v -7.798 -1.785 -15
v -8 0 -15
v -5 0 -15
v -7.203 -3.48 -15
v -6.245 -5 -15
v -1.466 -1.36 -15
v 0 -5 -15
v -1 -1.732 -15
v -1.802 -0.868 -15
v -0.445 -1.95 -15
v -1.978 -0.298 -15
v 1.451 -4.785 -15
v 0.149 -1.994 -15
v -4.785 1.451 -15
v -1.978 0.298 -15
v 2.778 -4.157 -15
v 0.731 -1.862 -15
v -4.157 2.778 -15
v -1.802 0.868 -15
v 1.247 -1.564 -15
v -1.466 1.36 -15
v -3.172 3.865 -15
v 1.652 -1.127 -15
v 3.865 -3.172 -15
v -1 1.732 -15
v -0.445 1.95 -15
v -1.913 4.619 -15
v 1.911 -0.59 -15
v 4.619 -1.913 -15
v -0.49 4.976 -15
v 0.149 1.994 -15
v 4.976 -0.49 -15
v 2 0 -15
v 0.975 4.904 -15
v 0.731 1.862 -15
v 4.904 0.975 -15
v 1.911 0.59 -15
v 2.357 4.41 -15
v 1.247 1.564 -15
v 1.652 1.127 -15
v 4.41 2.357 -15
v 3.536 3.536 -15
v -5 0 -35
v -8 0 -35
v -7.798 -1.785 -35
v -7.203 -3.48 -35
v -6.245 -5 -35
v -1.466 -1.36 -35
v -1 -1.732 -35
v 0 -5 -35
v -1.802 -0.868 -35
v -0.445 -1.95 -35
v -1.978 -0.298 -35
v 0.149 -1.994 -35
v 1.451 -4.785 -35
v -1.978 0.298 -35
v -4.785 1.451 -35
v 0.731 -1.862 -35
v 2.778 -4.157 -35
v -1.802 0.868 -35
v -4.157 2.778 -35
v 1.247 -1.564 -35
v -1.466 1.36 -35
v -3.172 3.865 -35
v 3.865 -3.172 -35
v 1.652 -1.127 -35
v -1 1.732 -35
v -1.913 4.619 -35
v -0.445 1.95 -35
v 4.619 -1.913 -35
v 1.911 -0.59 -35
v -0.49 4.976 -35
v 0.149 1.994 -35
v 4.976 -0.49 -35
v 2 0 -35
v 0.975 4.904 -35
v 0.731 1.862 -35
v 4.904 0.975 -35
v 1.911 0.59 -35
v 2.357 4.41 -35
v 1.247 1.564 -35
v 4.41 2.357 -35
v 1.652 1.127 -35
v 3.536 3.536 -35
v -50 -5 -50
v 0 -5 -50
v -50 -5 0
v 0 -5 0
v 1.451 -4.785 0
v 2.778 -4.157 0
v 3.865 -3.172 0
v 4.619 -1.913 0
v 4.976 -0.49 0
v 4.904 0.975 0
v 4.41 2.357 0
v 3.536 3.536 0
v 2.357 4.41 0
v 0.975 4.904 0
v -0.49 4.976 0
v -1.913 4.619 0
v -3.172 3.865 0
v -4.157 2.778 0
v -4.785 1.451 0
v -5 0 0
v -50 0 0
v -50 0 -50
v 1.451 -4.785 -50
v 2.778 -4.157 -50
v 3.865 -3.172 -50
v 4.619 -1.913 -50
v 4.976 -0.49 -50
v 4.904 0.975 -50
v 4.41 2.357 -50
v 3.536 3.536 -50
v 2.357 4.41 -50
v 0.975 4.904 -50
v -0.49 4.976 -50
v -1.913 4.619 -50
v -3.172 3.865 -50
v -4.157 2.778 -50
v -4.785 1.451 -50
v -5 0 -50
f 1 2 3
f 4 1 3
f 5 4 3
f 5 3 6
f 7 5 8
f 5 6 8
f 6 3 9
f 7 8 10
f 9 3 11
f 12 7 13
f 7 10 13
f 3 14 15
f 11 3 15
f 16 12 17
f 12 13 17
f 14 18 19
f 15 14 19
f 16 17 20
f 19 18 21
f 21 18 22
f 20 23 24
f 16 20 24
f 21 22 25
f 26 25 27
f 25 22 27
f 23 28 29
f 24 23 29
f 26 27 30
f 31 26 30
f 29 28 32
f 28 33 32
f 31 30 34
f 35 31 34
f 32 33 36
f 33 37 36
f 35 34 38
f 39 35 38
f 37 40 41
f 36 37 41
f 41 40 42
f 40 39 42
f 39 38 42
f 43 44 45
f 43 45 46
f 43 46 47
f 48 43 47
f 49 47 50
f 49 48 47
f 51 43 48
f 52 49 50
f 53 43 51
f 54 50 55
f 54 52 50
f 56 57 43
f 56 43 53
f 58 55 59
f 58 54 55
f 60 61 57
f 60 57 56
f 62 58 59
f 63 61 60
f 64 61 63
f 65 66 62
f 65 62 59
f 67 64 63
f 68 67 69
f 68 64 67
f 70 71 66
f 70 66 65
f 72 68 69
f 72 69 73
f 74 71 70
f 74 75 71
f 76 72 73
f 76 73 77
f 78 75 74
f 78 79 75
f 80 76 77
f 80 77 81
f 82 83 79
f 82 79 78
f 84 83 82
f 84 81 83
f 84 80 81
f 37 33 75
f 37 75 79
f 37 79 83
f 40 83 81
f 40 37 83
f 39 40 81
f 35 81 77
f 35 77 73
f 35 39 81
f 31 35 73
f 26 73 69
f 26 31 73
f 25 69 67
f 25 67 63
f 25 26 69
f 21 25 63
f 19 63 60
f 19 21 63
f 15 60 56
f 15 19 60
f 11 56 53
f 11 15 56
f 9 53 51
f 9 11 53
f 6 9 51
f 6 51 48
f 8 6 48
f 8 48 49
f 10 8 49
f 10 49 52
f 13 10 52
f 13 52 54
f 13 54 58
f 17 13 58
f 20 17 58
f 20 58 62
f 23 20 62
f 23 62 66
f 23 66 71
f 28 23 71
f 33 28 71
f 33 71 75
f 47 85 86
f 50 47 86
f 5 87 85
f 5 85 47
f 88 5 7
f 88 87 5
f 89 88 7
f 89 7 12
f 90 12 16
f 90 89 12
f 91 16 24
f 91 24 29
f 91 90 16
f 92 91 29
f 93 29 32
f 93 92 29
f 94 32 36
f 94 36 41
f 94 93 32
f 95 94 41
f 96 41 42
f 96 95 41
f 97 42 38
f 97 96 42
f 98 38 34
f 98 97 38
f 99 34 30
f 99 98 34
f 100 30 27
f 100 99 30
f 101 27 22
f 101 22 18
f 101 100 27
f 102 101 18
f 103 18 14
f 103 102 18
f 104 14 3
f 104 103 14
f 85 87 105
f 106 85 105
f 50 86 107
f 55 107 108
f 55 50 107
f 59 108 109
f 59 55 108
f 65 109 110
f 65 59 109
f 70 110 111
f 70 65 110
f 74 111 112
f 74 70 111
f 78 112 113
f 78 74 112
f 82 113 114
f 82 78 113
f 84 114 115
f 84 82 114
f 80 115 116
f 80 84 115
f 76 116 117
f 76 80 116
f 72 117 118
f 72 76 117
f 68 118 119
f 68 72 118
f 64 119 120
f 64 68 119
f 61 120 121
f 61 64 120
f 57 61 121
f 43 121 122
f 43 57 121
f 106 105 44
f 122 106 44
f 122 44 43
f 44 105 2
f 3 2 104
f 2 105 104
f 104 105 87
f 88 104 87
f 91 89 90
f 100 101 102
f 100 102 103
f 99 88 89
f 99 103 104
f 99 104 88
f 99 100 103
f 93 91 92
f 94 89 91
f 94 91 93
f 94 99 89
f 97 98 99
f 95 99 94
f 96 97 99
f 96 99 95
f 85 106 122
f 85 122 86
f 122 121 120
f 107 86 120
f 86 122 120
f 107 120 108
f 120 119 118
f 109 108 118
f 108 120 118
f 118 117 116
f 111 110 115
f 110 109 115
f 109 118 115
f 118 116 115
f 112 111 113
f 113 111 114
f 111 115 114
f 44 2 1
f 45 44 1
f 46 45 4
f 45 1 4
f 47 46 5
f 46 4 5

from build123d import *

# Parameters (mm, degrees)
SKETCH2_W           = 50
SKETCH2_H           = 5
BOSS_EXTRUDE1_DEPTH = 50
SKETCH3_R           = 8
CUT_EXTRUDE1_DEPTH  = 50
SKETCH4_R           = 5
BOSS_EXTRUDE2_DEPTH = 50
SKETCH6_R           = 5
CUT_EXTRUDE2_DEPTH  = 20
SKETCH7_W           = 10
SKETCH7_H           = 5
BOSS_EXTRUDE3_DEPTH = 15
LPATTERN1_COUNT     = 2
LPATTERN1_PITCH     = 35
SKETCH8_R           = 2
BOSS_EXTRUDE4_DEPTH = 50


with BuildPart() as part:
    # Sketch2 → Boss-Extrude1 (new body)
    with BuildSketch(Plane.XY):
        with Locations((-25, -2.5)):
            Rectangle(SKETCH2_W, SKETCH2_H)
    extrude(amount=-BOSS_EXTRUDE1_DEPTH)

    # Sketch3 → Cut-Extrude1 (cut)
    with BuildSketch(Plane.XY):
        Circle(SKETCH3_R)
    extrude(amount=-CUT_EXTRUDE1_DEPTH, mode=Mode.SUBTRACT)



with BuildPart() as body_2:
    # Sketch4 → Boss-Extrude2 (new body)
    with BuildSketch(Plane.XY):
        Circle(SKETCH4_R)
    extrude(amount=-BOSS_EXTRUDE2_DEPTH)

    # Sketch6 → Cut-Extrude2 (cut)
    with BuildSketch(Plane.XY.offset(-15)):
        Circle(SKETCH6_R)
    extrude(amount=-CUT_EXTRUDE2_DEPTH, mode=Mode.SUBTRACT)


with BuildPart() as cut_extrude2_piece_1:
    # of the separate pieces the step leaves, piece 1, a body of its own (cut_extrude2_pieces)
    add(body_2.part.solids().sort_by_distance((5, 0, 0))[0])


with BuildPart() as cut_extrude2_piece_2:
    # of the separate pieces the step leaves, piece 2, a body of its own (cut_extrude2_pieces)
    add(body_2.part.solids().sort_by_distance((5, 0, -35))[0])


with BuildPart() as part_1:
    add(part.part)

    add(cut_extrude2_piece_1.part)  # Boss-Extrude3 merges Cut-Extrude2 piece 1
    # Sketch7 → Boss-Extrude3 (add)
    with BuildSketch(Plane.XY):
        with Locations((-5, -2.5)):
            Rectangle(SKETCH7_W, SKETCH7_H)
    boss_extrude3 = extrude(amount=-BOSS_EXTRUDE3_DEPTH)


    add(cut_extrude2_piece_2.part)  # LPattern1 merges Cut-Extrude2 piece 2
    # LPattern1: Boss-Extrude3 ×2
    with Locations(*[(0, 0, -i * LPATTERN1_PITCH) for i in range(1, LPATTERN1_COUNT)]):
        add(boss_extrude3)

    # Sketch8 → Boss-Extrude4 (add)
    with BuildSketch(Plane.XY):
        Circle(SKETCH8_R)
    extrude(amount=-BOSS_EXTRUDE4_DEPTH)


solid = part_1.part
